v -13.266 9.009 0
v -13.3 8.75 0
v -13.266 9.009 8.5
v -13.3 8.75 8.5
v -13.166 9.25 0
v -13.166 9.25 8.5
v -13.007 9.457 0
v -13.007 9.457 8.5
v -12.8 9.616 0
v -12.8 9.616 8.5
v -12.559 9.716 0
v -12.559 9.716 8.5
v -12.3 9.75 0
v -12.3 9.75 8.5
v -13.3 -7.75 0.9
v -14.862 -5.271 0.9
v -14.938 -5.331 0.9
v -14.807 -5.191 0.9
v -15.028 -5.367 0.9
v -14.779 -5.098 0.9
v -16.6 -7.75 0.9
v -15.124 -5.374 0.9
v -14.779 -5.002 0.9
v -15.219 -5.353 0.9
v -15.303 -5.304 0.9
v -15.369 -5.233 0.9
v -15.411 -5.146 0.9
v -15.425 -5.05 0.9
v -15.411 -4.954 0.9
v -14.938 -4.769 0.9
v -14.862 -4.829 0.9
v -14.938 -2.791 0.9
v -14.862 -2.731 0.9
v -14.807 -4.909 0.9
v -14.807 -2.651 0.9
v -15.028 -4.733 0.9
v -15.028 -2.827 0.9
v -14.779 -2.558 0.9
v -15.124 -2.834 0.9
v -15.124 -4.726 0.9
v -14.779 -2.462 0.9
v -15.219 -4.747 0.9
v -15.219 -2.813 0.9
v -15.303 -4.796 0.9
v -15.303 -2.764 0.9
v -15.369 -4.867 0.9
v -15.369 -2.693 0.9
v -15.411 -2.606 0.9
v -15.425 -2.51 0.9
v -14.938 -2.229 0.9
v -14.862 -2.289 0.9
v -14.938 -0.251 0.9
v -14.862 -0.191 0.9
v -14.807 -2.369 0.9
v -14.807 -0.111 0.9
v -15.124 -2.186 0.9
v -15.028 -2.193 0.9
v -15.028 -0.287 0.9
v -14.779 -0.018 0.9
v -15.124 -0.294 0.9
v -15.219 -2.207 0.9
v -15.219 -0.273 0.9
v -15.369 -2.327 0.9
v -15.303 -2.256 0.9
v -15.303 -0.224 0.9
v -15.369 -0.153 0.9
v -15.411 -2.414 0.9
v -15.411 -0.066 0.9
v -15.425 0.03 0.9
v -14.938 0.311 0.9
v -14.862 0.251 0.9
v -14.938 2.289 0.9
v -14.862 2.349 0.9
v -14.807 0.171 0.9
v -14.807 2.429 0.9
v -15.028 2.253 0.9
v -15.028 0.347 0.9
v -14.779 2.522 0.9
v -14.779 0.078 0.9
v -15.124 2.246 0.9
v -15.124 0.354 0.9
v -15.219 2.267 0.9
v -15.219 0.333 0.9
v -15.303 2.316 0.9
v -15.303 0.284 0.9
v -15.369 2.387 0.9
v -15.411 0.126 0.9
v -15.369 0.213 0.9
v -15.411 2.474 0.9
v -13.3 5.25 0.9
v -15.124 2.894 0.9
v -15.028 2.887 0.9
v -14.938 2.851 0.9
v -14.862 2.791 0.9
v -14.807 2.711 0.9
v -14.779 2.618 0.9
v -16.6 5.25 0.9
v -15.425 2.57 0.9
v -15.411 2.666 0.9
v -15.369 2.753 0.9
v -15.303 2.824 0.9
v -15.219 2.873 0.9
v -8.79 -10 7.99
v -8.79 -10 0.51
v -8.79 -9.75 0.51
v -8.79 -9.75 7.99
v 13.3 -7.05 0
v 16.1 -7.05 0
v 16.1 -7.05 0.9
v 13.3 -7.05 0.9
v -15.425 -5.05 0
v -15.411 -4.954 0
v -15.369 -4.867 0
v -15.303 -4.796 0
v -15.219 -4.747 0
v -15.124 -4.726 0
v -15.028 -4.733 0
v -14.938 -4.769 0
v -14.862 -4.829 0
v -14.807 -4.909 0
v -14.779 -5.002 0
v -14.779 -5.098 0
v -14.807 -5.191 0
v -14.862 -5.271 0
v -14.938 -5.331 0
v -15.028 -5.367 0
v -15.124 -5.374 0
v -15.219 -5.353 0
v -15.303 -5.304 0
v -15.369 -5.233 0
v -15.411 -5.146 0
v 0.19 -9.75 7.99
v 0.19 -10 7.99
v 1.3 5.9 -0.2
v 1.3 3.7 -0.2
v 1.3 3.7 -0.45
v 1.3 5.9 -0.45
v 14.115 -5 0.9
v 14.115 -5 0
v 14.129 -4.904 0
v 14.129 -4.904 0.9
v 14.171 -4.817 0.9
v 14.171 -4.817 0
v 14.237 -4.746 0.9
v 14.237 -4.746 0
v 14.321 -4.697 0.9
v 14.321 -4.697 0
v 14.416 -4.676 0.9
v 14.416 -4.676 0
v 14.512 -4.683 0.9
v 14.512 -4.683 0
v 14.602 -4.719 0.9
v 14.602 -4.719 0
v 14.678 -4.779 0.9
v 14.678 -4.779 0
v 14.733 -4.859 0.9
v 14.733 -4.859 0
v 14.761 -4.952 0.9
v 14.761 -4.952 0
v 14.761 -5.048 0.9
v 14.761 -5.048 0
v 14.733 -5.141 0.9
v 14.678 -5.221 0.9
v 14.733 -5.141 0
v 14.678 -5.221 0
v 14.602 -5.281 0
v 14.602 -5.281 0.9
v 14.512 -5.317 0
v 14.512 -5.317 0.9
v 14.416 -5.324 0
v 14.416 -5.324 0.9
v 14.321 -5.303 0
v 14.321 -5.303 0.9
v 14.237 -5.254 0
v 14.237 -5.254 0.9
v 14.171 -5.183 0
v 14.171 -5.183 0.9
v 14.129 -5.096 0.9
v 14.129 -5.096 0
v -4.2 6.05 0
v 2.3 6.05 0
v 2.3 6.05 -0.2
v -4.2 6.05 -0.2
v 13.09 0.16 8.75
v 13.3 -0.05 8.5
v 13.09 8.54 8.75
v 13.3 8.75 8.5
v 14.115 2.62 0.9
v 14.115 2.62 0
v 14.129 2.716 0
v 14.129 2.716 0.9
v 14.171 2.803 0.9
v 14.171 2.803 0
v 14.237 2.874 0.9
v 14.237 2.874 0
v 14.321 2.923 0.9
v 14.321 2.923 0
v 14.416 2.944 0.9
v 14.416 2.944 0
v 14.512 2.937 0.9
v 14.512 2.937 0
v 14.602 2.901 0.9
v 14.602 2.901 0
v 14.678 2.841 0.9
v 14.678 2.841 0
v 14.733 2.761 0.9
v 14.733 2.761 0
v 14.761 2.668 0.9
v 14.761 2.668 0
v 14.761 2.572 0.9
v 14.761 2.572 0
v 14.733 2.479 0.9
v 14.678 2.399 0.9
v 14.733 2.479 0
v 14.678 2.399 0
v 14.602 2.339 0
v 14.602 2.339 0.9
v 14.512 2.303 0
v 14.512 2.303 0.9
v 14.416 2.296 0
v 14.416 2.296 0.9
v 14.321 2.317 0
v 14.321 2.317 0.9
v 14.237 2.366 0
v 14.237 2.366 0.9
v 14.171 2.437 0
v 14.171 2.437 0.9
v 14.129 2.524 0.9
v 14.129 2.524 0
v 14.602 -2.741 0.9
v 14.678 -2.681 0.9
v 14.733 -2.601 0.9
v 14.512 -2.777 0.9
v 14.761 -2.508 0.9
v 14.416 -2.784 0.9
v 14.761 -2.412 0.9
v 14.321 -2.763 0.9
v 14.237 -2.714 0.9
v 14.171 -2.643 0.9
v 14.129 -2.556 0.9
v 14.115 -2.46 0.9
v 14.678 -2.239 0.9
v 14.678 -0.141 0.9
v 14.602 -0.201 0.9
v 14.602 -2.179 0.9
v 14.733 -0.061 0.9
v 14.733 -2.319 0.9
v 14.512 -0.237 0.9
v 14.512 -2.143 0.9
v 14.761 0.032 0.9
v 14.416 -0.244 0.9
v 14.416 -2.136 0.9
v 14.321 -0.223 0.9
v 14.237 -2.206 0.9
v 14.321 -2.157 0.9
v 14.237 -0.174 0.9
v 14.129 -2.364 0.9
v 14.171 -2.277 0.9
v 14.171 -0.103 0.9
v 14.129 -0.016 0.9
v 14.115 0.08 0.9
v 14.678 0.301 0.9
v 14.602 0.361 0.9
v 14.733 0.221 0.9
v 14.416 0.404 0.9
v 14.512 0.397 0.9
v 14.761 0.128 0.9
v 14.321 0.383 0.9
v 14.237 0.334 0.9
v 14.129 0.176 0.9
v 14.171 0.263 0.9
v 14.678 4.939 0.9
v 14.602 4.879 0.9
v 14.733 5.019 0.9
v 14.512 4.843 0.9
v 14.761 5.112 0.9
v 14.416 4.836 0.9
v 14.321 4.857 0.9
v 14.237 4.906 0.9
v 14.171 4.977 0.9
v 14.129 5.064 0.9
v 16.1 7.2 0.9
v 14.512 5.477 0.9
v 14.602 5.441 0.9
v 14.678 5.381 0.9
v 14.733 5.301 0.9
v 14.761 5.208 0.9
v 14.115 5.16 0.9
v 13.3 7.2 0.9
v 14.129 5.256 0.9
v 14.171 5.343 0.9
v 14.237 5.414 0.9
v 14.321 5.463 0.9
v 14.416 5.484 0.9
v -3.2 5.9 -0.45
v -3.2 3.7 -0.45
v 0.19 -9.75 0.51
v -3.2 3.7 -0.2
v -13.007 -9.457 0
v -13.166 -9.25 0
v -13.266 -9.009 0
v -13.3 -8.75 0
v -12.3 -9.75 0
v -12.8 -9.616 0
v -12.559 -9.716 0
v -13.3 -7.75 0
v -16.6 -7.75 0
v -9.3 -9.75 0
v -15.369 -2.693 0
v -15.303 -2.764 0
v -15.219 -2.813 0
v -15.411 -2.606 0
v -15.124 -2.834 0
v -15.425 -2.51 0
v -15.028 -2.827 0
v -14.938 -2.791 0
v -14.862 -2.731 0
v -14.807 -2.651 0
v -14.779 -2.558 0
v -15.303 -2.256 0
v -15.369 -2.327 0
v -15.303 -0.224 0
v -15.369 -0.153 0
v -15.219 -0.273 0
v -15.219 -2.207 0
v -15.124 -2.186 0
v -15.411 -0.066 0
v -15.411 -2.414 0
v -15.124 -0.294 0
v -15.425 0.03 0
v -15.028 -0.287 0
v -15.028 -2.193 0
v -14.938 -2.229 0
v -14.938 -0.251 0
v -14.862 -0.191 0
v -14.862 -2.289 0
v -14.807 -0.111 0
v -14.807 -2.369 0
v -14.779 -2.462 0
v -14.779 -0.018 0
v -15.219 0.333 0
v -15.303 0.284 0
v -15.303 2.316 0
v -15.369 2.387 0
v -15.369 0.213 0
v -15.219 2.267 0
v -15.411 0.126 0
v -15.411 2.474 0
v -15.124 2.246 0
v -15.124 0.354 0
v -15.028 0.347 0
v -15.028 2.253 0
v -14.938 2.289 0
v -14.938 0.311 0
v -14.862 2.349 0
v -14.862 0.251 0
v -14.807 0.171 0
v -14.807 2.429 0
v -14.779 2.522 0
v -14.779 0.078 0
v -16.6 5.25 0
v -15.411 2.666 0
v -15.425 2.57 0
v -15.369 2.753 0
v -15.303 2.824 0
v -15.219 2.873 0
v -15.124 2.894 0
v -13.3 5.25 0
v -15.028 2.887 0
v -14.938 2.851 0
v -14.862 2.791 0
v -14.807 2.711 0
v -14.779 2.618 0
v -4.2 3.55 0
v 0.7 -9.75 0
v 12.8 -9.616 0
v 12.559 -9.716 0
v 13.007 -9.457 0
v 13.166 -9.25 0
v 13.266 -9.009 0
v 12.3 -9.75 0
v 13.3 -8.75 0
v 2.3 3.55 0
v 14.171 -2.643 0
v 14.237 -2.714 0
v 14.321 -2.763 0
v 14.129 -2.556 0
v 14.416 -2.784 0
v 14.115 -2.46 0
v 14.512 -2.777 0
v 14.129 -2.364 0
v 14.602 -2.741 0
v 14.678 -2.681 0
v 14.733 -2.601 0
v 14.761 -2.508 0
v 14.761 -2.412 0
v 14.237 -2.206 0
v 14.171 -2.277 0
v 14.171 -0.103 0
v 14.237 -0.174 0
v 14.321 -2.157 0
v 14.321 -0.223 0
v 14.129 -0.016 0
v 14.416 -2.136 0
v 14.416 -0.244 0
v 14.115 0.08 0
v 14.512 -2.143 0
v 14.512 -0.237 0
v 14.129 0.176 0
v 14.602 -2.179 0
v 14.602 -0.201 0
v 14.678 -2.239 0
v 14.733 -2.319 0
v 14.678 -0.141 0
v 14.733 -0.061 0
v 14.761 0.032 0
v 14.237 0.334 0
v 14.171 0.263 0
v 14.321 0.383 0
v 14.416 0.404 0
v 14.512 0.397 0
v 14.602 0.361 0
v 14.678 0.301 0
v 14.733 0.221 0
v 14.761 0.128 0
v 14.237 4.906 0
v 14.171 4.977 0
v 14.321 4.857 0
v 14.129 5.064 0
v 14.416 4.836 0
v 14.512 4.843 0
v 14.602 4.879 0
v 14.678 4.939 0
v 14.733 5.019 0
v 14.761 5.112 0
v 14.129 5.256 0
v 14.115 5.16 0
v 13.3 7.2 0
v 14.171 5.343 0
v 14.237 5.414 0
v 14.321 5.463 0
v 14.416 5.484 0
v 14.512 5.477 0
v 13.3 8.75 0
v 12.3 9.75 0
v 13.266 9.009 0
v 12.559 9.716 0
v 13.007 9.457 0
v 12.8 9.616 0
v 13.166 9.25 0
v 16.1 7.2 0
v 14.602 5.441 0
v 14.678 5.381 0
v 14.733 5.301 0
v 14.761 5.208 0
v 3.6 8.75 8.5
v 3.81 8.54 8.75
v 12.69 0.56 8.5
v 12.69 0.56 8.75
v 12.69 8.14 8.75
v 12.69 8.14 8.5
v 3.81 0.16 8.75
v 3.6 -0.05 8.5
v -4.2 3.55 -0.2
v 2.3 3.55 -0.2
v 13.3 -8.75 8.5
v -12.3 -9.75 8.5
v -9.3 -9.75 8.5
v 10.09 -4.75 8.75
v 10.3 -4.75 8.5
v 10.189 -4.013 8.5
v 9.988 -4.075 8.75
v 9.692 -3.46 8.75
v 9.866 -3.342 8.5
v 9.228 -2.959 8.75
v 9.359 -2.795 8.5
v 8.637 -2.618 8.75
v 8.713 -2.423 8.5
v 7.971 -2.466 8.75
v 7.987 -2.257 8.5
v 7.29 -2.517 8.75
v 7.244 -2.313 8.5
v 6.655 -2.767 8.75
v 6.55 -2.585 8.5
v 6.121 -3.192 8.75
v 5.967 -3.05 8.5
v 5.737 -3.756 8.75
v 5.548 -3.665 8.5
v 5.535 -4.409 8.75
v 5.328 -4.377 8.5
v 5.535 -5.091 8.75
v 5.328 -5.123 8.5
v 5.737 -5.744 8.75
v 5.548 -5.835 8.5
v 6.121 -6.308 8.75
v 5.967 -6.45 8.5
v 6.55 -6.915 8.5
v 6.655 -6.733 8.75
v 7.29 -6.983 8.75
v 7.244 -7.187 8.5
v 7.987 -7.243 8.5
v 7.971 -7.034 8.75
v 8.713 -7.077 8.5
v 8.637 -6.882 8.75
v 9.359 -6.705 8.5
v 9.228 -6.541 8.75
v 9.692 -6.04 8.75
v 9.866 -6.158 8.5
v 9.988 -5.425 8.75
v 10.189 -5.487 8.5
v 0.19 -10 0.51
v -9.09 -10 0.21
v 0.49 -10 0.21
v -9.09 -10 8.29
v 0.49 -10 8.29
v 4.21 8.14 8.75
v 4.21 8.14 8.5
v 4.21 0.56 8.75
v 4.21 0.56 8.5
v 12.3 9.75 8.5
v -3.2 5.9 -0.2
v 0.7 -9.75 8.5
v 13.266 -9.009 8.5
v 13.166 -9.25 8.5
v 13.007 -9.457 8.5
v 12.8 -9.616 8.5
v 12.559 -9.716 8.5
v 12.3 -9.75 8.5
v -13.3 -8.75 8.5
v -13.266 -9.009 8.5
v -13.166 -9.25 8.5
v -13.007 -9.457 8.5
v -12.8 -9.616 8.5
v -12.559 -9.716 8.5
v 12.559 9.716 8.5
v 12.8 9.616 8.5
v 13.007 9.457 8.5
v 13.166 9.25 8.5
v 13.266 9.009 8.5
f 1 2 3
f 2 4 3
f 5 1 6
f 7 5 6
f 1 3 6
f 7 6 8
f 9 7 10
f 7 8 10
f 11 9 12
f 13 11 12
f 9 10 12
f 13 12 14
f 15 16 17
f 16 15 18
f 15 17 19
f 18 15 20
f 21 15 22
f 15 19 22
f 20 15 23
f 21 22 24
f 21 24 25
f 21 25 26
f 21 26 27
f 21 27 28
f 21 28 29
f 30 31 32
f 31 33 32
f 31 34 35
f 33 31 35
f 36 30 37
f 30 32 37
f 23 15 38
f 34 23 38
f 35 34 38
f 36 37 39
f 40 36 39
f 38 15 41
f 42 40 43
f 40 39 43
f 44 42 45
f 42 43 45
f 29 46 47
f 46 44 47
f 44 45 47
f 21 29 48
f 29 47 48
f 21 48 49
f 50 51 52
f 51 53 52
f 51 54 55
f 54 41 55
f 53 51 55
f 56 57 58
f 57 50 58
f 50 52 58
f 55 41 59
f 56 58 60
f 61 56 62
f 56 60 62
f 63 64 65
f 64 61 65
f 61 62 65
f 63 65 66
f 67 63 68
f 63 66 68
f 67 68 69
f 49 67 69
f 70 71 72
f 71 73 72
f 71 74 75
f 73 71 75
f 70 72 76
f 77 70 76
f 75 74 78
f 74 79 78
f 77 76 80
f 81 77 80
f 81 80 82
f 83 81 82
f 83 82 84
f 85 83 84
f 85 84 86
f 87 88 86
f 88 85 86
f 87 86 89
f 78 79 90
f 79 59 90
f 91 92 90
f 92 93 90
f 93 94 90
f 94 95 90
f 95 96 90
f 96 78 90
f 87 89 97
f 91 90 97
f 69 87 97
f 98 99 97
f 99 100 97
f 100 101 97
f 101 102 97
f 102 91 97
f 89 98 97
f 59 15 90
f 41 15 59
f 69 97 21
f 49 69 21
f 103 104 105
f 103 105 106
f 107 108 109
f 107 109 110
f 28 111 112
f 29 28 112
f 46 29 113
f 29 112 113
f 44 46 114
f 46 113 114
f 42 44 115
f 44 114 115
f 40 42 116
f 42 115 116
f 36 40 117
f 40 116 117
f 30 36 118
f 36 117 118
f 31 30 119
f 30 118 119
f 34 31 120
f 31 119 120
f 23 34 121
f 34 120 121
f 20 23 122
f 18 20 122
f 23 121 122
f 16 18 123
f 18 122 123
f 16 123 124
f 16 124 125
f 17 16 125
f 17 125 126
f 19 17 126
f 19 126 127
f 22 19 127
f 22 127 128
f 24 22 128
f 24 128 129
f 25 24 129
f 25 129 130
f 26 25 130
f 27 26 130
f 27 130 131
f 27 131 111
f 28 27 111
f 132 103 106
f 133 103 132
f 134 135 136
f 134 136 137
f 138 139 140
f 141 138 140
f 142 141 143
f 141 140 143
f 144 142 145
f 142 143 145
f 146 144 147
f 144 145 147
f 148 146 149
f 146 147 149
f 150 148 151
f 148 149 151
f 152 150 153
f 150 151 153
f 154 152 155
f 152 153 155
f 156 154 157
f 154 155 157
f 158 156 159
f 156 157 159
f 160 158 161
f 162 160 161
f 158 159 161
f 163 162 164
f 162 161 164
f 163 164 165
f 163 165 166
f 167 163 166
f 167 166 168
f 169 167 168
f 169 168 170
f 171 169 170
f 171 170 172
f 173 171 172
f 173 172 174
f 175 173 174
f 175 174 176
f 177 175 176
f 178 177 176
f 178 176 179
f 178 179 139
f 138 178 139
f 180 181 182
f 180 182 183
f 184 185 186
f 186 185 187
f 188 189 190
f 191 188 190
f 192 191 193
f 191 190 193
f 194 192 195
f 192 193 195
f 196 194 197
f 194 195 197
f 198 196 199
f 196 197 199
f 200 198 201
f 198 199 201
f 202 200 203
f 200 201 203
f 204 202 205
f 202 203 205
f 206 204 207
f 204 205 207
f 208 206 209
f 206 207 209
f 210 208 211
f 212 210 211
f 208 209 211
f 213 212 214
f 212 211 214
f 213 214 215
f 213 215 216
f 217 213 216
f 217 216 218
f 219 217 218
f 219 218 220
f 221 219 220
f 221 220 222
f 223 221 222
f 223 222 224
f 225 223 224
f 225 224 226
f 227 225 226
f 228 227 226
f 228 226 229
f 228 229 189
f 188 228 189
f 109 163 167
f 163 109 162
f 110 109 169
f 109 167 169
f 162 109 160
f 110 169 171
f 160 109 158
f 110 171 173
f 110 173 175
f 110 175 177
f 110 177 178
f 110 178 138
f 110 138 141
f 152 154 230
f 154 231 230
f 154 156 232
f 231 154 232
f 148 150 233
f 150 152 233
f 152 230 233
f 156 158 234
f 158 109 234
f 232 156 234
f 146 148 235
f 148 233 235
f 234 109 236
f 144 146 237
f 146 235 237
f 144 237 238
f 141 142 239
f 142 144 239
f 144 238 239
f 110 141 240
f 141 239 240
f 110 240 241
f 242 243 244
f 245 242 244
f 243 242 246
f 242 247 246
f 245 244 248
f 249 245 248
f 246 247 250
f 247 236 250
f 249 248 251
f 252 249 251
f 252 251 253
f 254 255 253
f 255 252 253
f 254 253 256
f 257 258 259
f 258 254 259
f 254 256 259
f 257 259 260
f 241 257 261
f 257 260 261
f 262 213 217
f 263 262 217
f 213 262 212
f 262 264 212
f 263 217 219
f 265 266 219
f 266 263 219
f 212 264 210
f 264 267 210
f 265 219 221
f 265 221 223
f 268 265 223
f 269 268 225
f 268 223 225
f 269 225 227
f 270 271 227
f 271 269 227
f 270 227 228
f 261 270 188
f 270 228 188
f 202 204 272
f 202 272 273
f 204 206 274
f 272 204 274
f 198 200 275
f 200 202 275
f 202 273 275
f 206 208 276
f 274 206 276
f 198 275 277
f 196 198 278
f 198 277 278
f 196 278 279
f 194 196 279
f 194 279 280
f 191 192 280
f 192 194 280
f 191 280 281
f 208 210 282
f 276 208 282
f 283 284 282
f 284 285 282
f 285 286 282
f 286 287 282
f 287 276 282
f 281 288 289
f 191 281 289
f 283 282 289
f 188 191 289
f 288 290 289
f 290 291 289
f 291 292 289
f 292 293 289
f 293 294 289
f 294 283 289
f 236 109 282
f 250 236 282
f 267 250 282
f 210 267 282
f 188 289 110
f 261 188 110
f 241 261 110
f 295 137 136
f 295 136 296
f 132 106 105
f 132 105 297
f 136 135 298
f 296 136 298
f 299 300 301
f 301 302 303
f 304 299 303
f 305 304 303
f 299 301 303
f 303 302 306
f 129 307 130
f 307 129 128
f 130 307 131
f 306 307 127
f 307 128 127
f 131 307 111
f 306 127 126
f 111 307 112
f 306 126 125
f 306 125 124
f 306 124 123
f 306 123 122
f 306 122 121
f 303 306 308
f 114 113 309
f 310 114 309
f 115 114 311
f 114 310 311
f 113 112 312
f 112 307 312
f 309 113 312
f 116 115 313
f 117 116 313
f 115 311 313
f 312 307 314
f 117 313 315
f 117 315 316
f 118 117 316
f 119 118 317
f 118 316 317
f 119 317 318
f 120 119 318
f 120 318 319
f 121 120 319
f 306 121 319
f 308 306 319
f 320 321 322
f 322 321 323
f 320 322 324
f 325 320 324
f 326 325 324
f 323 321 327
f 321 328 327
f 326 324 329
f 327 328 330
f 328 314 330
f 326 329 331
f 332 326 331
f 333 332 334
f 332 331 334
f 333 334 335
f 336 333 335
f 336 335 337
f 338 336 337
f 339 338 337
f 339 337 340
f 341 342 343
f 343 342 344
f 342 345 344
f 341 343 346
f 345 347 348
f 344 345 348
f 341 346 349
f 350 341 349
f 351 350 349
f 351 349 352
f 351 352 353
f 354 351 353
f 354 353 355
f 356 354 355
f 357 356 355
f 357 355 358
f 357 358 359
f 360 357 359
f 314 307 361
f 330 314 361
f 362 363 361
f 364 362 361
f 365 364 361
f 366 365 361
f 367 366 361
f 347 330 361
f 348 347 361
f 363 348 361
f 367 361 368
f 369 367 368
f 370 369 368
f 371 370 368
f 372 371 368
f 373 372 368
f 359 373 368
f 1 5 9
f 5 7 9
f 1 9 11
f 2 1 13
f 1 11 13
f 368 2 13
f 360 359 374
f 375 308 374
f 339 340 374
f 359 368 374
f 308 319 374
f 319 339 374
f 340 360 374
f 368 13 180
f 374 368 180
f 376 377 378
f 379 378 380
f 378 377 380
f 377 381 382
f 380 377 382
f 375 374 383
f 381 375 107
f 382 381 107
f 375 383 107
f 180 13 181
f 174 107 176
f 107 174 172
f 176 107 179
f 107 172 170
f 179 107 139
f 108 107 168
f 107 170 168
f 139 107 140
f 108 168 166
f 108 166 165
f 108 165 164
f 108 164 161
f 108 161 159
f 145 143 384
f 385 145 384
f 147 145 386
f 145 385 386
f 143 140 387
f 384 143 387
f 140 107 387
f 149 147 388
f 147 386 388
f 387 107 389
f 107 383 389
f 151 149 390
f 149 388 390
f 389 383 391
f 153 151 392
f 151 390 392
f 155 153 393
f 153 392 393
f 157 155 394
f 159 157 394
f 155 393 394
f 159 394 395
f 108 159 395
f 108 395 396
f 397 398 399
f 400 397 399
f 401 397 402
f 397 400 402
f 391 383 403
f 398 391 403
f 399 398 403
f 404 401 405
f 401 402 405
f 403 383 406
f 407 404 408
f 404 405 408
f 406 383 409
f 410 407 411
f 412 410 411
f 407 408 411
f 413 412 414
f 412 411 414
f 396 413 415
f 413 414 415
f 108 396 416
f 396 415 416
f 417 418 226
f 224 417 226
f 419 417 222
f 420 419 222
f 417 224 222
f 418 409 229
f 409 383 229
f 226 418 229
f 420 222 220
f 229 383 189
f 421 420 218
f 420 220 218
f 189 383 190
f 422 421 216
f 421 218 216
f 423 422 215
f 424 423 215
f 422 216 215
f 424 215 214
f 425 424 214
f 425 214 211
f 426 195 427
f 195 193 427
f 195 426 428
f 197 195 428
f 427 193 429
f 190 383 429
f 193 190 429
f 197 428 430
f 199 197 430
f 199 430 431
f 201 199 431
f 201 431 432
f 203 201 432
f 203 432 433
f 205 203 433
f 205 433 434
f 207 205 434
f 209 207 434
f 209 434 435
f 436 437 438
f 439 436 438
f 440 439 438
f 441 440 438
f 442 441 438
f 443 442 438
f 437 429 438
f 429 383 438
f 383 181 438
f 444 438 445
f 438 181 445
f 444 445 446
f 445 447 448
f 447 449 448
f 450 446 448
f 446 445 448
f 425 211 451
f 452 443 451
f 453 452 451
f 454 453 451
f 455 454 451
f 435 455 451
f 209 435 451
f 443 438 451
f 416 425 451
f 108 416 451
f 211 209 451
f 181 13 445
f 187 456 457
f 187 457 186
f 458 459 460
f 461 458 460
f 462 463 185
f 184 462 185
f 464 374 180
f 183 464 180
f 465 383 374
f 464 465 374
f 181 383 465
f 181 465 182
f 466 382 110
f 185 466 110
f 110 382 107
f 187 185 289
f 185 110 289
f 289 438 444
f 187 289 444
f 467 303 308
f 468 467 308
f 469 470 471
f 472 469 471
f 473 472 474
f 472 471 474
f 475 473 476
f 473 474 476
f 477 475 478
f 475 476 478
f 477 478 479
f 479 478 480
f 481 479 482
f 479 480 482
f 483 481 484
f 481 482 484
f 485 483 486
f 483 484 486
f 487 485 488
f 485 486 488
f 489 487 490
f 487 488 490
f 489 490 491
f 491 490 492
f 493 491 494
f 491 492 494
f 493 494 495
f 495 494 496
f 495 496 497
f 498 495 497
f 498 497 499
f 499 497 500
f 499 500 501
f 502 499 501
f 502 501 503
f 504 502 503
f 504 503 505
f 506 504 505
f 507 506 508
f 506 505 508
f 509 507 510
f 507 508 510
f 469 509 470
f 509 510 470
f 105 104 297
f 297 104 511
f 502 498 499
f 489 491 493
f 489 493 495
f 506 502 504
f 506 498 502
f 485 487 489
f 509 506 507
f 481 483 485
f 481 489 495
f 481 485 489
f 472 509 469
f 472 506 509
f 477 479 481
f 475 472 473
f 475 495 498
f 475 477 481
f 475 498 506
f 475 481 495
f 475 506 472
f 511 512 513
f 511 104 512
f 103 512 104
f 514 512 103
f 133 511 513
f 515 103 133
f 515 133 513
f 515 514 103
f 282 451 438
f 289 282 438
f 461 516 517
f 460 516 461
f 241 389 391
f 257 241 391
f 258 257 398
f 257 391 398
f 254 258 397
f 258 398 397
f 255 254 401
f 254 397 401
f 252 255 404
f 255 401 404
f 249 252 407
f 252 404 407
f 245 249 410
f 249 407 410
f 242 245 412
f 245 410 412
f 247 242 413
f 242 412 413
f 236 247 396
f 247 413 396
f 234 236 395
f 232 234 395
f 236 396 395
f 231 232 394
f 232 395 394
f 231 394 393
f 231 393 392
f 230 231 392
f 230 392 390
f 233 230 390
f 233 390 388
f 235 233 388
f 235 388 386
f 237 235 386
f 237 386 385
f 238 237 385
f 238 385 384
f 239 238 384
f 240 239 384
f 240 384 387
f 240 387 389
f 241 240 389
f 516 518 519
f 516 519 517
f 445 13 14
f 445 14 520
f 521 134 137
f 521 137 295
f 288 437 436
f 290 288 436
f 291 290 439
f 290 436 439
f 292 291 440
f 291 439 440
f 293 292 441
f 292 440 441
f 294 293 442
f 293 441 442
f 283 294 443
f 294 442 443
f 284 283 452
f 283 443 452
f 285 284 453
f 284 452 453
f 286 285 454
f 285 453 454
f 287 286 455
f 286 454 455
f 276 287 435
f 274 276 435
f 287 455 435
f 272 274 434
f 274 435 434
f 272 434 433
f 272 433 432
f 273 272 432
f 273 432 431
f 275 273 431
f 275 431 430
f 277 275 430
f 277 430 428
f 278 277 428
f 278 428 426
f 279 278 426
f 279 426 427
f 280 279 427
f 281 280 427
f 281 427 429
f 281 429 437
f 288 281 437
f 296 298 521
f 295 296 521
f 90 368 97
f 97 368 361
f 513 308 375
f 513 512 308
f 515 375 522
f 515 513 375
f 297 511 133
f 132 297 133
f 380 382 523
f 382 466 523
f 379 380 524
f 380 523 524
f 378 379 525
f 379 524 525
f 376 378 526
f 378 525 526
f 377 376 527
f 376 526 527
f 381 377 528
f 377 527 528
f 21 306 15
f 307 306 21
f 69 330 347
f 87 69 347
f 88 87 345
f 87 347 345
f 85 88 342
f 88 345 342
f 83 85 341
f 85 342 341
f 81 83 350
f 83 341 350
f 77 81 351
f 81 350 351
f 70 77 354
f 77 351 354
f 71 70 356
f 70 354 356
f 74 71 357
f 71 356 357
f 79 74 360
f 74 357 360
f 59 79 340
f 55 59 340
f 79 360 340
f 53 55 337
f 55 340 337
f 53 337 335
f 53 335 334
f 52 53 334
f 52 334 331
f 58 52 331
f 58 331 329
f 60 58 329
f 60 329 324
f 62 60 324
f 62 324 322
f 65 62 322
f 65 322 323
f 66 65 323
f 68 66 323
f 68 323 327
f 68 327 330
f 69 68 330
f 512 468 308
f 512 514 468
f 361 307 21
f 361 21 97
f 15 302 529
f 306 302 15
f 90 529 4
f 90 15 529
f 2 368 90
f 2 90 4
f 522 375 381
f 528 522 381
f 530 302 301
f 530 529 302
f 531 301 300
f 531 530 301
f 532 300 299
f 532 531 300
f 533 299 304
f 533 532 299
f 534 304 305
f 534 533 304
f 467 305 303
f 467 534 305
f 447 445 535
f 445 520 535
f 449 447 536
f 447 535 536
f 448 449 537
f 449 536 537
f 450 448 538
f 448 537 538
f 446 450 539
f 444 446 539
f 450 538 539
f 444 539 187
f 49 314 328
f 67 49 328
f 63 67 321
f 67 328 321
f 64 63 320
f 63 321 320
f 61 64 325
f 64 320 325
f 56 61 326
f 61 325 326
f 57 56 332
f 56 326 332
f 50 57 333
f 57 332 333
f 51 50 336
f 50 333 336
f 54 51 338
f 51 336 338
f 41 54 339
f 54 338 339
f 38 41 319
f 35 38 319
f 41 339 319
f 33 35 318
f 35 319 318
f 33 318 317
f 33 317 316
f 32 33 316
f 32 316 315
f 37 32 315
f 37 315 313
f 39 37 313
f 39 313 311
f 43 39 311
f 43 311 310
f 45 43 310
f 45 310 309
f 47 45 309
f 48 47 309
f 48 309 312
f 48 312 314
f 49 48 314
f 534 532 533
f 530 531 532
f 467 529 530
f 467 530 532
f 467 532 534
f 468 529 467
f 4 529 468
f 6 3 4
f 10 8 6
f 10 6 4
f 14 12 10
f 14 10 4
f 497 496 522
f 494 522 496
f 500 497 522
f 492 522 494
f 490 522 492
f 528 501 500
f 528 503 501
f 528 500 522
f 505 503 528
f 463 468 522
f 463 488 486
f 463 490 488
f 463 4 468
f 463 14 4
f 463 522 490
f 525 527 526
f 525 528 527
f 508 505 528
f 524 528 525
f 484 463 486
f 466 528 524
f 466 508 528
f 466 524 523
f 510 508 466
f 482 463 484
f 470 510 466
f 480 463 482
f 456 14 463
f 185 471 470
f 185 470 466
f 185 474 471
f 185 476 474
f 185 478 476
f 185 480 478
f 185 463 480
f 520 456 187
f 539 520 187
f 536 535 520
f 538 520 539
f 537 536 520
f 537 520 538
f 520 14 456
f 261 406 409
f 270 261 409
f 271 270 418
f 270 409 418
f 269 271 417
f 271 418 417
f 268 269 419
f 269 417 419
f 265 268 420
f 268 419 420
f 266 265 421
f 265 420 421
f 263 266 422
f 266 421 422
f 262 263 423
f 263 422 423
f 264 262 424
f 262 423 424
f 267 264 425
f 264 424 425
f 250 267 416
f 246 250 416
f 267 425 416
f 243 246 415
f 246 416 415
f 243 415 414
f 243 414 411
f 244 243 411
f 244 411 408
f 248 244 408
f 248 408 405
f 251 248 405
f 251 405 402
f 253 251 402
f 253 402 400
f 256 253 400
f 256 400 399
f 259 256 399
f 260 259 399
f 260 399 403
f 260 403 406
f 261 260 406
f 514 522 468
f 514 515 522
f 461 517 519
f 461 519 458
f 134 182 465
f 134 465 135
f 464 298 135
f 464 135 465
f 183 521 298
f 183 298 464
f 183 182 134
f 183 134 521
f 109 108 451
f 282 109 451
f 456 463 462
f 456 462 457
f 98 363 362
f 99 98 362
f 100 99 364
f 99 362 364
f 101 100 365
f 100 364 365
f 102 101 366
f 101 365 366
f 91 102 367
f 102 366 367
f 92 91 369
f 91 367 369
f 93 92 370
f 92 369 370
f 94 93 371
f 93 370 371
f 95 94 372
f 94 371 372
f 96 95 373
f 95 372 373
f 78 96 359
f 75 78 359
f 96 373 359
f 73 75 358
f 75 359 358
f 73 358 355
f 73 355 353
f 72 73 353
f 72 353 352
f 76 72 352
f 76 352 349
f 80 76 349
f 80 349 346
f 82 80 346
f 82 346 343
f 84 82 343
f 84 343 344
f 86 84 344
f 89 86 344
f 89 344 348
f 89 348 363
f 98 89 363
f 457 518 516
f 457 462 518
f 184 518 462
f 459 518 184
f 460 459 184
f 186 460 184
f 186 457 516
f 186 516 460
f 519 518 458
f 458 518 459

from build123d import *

# Parameters (mm, degrees)
SKETCH1_W                     = 26.6
SKETCH1_H                     = 19.5
BASE_DEPTH                    = 8.5
SKETCH2_R                     = 2.5
BOSS_EXTRUDE2_DEPTH           = 0.25
BOSS_EXTRUDE2_DRAFT           = 40
SKETCH2_W                     = 9.7
SKETCH2_H                     = 8.8
BOSS_EXTRUDE2_PROFILE_2_DEPTH = 0.25
BOSS_EXTRUDE2_PROFILE_2_DRAFT = 40
SKETCH3_W                     = 8.480450184
SKETCH3_H                     = 7.580450184
CUT_EXTRUDE1_DEPTH            = 0.25
SKETCH4_W                     = 10
SKETCH4_H                     = 8.5
BOSS_EXTRUDE3_DEPTH           = 0.25
BOSS_EXTRUDE3_TAPER           = 40
SKETCH5_W                     = 8.980450184
SKETCH5_H                     = 7.480450184
CUT_EXTRUDE2_DEPTH            = 0.25
FILLET1_R                     = 1
SKETCH6_W                     = 6.5
SKETCH6_H                     = 2.5
CONNECTOR1_DEPTH              = 0.2
SKETCH7_W                     = 4.5
SKETCH7_H                     = 2.2
CONNECTOR2_DEPTH              = 0.25
SKETCH8_W                     = 3.3
SKETCH8_H                     = 13
SKETCH8_W_2                   = 2.8
SKETCH8_H_2                   = 14.25
PCB_DEPTH                     = 0.9
CUT_EXTRUDE3_REACH            = 23.263
SKETCH9_R                     = 0.325


with BuildPart() as part:
    # Sketch1 → Base (new body)
    with BuildSketch(Plane.XY):
        Rectangle(SKETCH1_W, SKETCH1_H)
    extrude(amount=BASE_DEPTH)


with BuildPart() as boss_extrude2_tool:
    # Sketch2 → Boss-Extrude2 (with draft: the straight prism first)
    with BuildSketch(Plane.XY.offset(8.5)):
        with Locations((7.8, -4.75)):
            Circle(SKETCH2_R)
    extrude(amount=BOSS_EXTRUDE2_DEPTH)
    # Boss-Extrude2: the draft: its side faces are tilted about the plane it starts from
    boss_extrude2_sides = [boss_extrude2_tool.faces().sort_by_distance(p)[0] for p in [
        (5.3, -4.75, 8.625),
    ]]
    draft(boss_extrude2_sides, Plane.XY.offset(8.5), BOSS_EXTRUDE2_DRAFT)


with BuildPart() as part_1:
    add(part.part)

    # Boss-Extrude2: add boss_extrude2_tool
    add(boss_extrude2_tool.part)


with BuildPart() as boss_extrude2_profile_2_tool:
    # Sketch2 → Boss-Extrude2 profile 2 (with draft: the straight prism first)
    with BuildSketch(Plane.XY.offset(8.5)):
        with Locations((8.45, 4.35)):
            Rectangle(SKETCH2_W, SKETCH2_H)
    extrude(amount=BOSS_EXTRUDE2_PROFILE_2_DEPTH)
    # Boss-Extrude2 profile 2: the draft: its side faces are tilted about the plane it starts from
    boss_extrude2_profile_2_sides = [boss_extrude2_profile_2_tool.faces().sort_by_distance(p)[0] for p in [
        (3.6, 4.35, 8.625),
        (8.45, -0.05, 8.625),
        (13.3, 4.35, 8.625),
        (8.45, 8.75, 8.625),
    ]]
    draft(boss_extrude2_profile_2_sides, Plane.XY.offset(8.5), BOSS_EXTRUDE2_PROFILE_2_DRAFT)


with BuildPart() as part_2:
    add(part_1.part)

    # Boss-Extrude2 profile 2: add boss_extrude2_profile_2_tool
    add(boss_extrude2_profile_2_tool.part)

    # Sketch3 → Cut-Extrude1 (cut)
    with BuildSketch(Plane.XY.offset(8.75)):
        with Locations((8.45, 4.35)):
            Rectangle(SKETCH3_W, SKETCH3_H)
    extrude(amount=-CUT_EXTRUDE1_DEPTH, mode=Mode.SUBTRACT)

    # Sketch4 → Boss-Extrude3 (add)
    with BuildSketch(Plane.XZ.offset(9.75)):
        with Locations((-4.3, 4.25)):
            Rectangle(SKETCH4_W, SKETCH4_H)
    extrude(amount=BOSS_EXTRUDE3_DEPTH, taper=BOSS_EXTRUDE3_TAPER)

    # Sketch5 → Cut-Extrude2 (cut)
    with BuildSketch(Plane.XZ.offset(10)):
        with Locations((-4.3, 4.25)):
            Rectangle(SKETCH5_W, SKETCH5_H)
    extrude(amount=-CUT_EXTRUDE2_DEPTH, mode=Mode.SUBTRACT)

    # Fillet1
    fillet1_edges = [part_2.edges().sort_by_distance(p)[0] for p in [
        (-13.3, 9.75, 4.25),
        (13.3, 9.75, 4.25),
        (13.3, -9.75, 4.25),
        (-13.3, -9.75, 4.25),
    ]]
    fillet(fillet1_edges, radius=FILLET1_R)

    # Sketch6 → Connector1 (add)
    with BuildSketch(Plane(origin=(0, 0, 0), x_dir=(-1, 0, 0), z_dir=(0, 0, -1))):
        with Locations((0.95, 4.8)):
            Rectangle(SKETCH6_W, SKETCH6_H)
    extrude(amount=CONNECTOR1_DEPTH)

    # Sketch7 → Connector2 (add)
    with BuildSketch(Plane(origin=(0, 0, -0.2), x_dir=(-1, 0, 0), z_dir=(0, 0, -1))):
        with Locations((0.95, 4.8)):
            Rectangle(SKETCH7_W, SKETCH7_H)
    extrude(amount=CONNECTOR2_DEPTH)

    # Sketch8 → PCB (add)
    with BuildSketch(Plane(origin=(0, 0, 0), x_dir=(-1, 0, 0), z_dir=(0, 0, -1))):
        with Locations((14.95, -1.25)):
            Rectangle(SKETCH8_W, SKETCH8_H)
        with Locations((-14.7, 0.075)):
            Rectangle(SKETCH8_W_2, SKETCH8_H_2)
    extrude(amount=-PCB_DEPTH)

    # Sketch9 → Cut-Extrude3 (cut, up to next)
    with BuildSketch(Plane(origin=(0, 0, 0), x_dir=(-1, 0, 0), z_dir=(0, 0, -1)), mode=Mode.PRIVATE) as cut_extrude3_sk1:
        with Locations((15.1, -5.05)):
            Circle(SKETCH9_R)
    cut_extrude3_tool1 = extrude(cut_extrude3_sk1.sketch, amount=-CUT_EXTRUDE3_REACH, mode=Mode.PRIVATE) & part_2.part
    # Sketch9 → Cut-Extrude3 (cut, up to next)
    with BuildSketch(Plane(origin=(0, 0, 0), x_dir=(-1, 0, 0), z_dir=(0, 0, -1)), mode=Mode.PRIVATE) as cut_extrude3_sk2:
        with Locations((15.1, -2.51)):
            Circle(SKETCH9_R)
    cut_extrude3_tool2 = extrude(cut_extrude3_sk2.sketch, amount=-CUT_EXTRUDE3_REACH, mode=Mode.PRIVATE) & part_2.part
    # Sketch9 → Cut-Extrude3 (cut, up to next)
    with BuildSketch(Plane(origin=(0, 0, 0), x_dir=(-1, 0, 0), z_dir=(0, 0, -1)), mode=Mode.PRIVATE) as cut_extrude3_sk3:
        with Locations((15.1, 0.03)):
            Circle(SKETCH9_R)
    cut_extrude3_tool3 = extrude(cut_extrude3_sk3.sketch, amount=-CUT_EXTRUDE3_REACH, mode=Mode.PRIVATE) & part_2.part
    # Sketch9 → Cut-Extrude3 (cut, up to next)
    with BuildSketch(Plane(origin=(0, 0, 0), x_dir=(-1, 0, 0), z_dir=(0, 0, -1)), mode=Mode.PRIVATE) as cut_extrude3_sk4:
        with Locations((15.1, 2.57)):
            Circle(SKETCH9_R)
    cut_extrude3_tool4 = extrude(cut_extrude3_sk4.sketch, amount=-CUT_EXTRUDE3_REACH, mode=Mode.PRIVATE) & part_2.part
    # Sketch9 → Cut-Extrude3 (cut, up to next)
    with BuildSketch(Plane(origin=(0, 0, 0), x_dir=(-1, 0, 0), z_dir=(0, 0, -1)), mode=Mode.PRIVATE) as cut_extrude3_sk5:
        with Locations((-14.44, -5)):
            Circle(SKETCH9_R)
    cut_extrude3_tool5 = extrude(cut_extrude3_sk5.sketch, amount=-CUT_EXTRUDE3_REACH, mode=Mode.PRIVATE) & part_2.part
    # Sketch9 → Cut-Extrude3 (cut, up to next)
    with BuildSketch(Plane(origin=(0, 0, 0), x_dir=(-1, 0, 0), z_dir=(0, 0, -1)), mode=Mode.PRIVATE) as cut_extrude3_sk6:
        with Locations((-14.44, -2.46)):
            Circle(SKETCH9_R)
    cut_extrude3_tool6 = extrude(cut_extrude3_sk6.sketch, amount=-CUT_EXTRUDE3_REACH, mode=Mode.PRIVATE) & part_2.part
    # Sketch9 → Cut-Extrude3 (cut, up to next)
    with BuildSketch(Plane(origin=(0, 0, 0), x_dir=(-1, 0, 0), z_dir=(0, 0, -1)), mode=Mode.PRIVATE) as cut_extrude3_sk7:
        with Locations((-14.44, 0.08)):
            Circle(SKETCH9_R)
    cut_extrude3_tool7 = extrude(cut_extrude3_sk7.sketch, amount=-CUT_EXTRUDE3_REACH, mode=Mode.PRIVATE) & part_2.part
    # Sketch9 → Cut-Extrude3 (cut, up to next)
    with BuildSketch(Plane(origin=(0, 0, 0), x_dir=(-1, 0, 0), z_dir=(0, 0, -1)), mode=Mode.PRIVATE) as cut_extrude3_sk8:
        with Locations((-14.44, 2.62)):
            Circle(SKETCH9_R)
    cut_extrude3_tool8 = extrude(cut_extrude3_sk8.sketch, amount=-CUT_EXTRUDE3_REACH, mode=Mode.PRIVATE) & part_2.part
    # Sketch9 → Cut-Extrude3 (cut, up to next)
    with BuildSketch(Plane(origin=(0, 0, 0), x_dir=(-1, 0, 0), z_dir=(0, 0, -1)), mode=Mode.PRIVATE) as cut_extrude3_sk9:
        with Locations((-14.44, 5.16)):
            Circle(SKETCH9_R)
    cut_extrude3_tool9 = extrude(cut_extrude3_sk9.sketch, amount=-CUT_EXTRUDE3_REACH, mode=Mode.PRIVATE) & part_2.part
    add(cut_extrude3_tool1.solids().sort_by_distance((-15.1, -5.05, 0))[0], mode=Mode.SUBTRACT)
    add(cut_extrude3_tool2.solids().sort_by_distance((-15.1, -2.51, 0))[0], mode=Mode.SUBTRACT)
    add(cut_extrude3_tool3.solids().sort_by_distance((-15.1, 0.03, 0))[0], mode=Mode.SUBTRACT)
    add(cut_extrude3_tool4.solids().sort_by_distance((-15.1, 2.57, 0))[0], mode=Mode.SUBTRACT)
    add(cut_extrude3_tool5.solids().sort_by_distance((14.44, -5, 0))[0], mode=Mode.SUBTRACT)
    add(cut_extrude3_tool6.solids().sort_by_distance((14.44, -2.46, 0))[0], mode=Mode.SUBTRACT)
    add(cut_extrude3_tool7.solids().sort_by_distance((14.44, 0.08, 0))[0], mode=Mode.SUBTRACT)
    add(cut_extrude3_tool8.solids().sort_by_distance((14.44, 2.62, 0))[0], mode=Mode.SUBTRACT)
    add(cut_extrude3_tool9.solids().sort_by_distance((14.44, 5.16, 0))[0], mode=Mode.SUBTRACT)


solid = part_2.part
